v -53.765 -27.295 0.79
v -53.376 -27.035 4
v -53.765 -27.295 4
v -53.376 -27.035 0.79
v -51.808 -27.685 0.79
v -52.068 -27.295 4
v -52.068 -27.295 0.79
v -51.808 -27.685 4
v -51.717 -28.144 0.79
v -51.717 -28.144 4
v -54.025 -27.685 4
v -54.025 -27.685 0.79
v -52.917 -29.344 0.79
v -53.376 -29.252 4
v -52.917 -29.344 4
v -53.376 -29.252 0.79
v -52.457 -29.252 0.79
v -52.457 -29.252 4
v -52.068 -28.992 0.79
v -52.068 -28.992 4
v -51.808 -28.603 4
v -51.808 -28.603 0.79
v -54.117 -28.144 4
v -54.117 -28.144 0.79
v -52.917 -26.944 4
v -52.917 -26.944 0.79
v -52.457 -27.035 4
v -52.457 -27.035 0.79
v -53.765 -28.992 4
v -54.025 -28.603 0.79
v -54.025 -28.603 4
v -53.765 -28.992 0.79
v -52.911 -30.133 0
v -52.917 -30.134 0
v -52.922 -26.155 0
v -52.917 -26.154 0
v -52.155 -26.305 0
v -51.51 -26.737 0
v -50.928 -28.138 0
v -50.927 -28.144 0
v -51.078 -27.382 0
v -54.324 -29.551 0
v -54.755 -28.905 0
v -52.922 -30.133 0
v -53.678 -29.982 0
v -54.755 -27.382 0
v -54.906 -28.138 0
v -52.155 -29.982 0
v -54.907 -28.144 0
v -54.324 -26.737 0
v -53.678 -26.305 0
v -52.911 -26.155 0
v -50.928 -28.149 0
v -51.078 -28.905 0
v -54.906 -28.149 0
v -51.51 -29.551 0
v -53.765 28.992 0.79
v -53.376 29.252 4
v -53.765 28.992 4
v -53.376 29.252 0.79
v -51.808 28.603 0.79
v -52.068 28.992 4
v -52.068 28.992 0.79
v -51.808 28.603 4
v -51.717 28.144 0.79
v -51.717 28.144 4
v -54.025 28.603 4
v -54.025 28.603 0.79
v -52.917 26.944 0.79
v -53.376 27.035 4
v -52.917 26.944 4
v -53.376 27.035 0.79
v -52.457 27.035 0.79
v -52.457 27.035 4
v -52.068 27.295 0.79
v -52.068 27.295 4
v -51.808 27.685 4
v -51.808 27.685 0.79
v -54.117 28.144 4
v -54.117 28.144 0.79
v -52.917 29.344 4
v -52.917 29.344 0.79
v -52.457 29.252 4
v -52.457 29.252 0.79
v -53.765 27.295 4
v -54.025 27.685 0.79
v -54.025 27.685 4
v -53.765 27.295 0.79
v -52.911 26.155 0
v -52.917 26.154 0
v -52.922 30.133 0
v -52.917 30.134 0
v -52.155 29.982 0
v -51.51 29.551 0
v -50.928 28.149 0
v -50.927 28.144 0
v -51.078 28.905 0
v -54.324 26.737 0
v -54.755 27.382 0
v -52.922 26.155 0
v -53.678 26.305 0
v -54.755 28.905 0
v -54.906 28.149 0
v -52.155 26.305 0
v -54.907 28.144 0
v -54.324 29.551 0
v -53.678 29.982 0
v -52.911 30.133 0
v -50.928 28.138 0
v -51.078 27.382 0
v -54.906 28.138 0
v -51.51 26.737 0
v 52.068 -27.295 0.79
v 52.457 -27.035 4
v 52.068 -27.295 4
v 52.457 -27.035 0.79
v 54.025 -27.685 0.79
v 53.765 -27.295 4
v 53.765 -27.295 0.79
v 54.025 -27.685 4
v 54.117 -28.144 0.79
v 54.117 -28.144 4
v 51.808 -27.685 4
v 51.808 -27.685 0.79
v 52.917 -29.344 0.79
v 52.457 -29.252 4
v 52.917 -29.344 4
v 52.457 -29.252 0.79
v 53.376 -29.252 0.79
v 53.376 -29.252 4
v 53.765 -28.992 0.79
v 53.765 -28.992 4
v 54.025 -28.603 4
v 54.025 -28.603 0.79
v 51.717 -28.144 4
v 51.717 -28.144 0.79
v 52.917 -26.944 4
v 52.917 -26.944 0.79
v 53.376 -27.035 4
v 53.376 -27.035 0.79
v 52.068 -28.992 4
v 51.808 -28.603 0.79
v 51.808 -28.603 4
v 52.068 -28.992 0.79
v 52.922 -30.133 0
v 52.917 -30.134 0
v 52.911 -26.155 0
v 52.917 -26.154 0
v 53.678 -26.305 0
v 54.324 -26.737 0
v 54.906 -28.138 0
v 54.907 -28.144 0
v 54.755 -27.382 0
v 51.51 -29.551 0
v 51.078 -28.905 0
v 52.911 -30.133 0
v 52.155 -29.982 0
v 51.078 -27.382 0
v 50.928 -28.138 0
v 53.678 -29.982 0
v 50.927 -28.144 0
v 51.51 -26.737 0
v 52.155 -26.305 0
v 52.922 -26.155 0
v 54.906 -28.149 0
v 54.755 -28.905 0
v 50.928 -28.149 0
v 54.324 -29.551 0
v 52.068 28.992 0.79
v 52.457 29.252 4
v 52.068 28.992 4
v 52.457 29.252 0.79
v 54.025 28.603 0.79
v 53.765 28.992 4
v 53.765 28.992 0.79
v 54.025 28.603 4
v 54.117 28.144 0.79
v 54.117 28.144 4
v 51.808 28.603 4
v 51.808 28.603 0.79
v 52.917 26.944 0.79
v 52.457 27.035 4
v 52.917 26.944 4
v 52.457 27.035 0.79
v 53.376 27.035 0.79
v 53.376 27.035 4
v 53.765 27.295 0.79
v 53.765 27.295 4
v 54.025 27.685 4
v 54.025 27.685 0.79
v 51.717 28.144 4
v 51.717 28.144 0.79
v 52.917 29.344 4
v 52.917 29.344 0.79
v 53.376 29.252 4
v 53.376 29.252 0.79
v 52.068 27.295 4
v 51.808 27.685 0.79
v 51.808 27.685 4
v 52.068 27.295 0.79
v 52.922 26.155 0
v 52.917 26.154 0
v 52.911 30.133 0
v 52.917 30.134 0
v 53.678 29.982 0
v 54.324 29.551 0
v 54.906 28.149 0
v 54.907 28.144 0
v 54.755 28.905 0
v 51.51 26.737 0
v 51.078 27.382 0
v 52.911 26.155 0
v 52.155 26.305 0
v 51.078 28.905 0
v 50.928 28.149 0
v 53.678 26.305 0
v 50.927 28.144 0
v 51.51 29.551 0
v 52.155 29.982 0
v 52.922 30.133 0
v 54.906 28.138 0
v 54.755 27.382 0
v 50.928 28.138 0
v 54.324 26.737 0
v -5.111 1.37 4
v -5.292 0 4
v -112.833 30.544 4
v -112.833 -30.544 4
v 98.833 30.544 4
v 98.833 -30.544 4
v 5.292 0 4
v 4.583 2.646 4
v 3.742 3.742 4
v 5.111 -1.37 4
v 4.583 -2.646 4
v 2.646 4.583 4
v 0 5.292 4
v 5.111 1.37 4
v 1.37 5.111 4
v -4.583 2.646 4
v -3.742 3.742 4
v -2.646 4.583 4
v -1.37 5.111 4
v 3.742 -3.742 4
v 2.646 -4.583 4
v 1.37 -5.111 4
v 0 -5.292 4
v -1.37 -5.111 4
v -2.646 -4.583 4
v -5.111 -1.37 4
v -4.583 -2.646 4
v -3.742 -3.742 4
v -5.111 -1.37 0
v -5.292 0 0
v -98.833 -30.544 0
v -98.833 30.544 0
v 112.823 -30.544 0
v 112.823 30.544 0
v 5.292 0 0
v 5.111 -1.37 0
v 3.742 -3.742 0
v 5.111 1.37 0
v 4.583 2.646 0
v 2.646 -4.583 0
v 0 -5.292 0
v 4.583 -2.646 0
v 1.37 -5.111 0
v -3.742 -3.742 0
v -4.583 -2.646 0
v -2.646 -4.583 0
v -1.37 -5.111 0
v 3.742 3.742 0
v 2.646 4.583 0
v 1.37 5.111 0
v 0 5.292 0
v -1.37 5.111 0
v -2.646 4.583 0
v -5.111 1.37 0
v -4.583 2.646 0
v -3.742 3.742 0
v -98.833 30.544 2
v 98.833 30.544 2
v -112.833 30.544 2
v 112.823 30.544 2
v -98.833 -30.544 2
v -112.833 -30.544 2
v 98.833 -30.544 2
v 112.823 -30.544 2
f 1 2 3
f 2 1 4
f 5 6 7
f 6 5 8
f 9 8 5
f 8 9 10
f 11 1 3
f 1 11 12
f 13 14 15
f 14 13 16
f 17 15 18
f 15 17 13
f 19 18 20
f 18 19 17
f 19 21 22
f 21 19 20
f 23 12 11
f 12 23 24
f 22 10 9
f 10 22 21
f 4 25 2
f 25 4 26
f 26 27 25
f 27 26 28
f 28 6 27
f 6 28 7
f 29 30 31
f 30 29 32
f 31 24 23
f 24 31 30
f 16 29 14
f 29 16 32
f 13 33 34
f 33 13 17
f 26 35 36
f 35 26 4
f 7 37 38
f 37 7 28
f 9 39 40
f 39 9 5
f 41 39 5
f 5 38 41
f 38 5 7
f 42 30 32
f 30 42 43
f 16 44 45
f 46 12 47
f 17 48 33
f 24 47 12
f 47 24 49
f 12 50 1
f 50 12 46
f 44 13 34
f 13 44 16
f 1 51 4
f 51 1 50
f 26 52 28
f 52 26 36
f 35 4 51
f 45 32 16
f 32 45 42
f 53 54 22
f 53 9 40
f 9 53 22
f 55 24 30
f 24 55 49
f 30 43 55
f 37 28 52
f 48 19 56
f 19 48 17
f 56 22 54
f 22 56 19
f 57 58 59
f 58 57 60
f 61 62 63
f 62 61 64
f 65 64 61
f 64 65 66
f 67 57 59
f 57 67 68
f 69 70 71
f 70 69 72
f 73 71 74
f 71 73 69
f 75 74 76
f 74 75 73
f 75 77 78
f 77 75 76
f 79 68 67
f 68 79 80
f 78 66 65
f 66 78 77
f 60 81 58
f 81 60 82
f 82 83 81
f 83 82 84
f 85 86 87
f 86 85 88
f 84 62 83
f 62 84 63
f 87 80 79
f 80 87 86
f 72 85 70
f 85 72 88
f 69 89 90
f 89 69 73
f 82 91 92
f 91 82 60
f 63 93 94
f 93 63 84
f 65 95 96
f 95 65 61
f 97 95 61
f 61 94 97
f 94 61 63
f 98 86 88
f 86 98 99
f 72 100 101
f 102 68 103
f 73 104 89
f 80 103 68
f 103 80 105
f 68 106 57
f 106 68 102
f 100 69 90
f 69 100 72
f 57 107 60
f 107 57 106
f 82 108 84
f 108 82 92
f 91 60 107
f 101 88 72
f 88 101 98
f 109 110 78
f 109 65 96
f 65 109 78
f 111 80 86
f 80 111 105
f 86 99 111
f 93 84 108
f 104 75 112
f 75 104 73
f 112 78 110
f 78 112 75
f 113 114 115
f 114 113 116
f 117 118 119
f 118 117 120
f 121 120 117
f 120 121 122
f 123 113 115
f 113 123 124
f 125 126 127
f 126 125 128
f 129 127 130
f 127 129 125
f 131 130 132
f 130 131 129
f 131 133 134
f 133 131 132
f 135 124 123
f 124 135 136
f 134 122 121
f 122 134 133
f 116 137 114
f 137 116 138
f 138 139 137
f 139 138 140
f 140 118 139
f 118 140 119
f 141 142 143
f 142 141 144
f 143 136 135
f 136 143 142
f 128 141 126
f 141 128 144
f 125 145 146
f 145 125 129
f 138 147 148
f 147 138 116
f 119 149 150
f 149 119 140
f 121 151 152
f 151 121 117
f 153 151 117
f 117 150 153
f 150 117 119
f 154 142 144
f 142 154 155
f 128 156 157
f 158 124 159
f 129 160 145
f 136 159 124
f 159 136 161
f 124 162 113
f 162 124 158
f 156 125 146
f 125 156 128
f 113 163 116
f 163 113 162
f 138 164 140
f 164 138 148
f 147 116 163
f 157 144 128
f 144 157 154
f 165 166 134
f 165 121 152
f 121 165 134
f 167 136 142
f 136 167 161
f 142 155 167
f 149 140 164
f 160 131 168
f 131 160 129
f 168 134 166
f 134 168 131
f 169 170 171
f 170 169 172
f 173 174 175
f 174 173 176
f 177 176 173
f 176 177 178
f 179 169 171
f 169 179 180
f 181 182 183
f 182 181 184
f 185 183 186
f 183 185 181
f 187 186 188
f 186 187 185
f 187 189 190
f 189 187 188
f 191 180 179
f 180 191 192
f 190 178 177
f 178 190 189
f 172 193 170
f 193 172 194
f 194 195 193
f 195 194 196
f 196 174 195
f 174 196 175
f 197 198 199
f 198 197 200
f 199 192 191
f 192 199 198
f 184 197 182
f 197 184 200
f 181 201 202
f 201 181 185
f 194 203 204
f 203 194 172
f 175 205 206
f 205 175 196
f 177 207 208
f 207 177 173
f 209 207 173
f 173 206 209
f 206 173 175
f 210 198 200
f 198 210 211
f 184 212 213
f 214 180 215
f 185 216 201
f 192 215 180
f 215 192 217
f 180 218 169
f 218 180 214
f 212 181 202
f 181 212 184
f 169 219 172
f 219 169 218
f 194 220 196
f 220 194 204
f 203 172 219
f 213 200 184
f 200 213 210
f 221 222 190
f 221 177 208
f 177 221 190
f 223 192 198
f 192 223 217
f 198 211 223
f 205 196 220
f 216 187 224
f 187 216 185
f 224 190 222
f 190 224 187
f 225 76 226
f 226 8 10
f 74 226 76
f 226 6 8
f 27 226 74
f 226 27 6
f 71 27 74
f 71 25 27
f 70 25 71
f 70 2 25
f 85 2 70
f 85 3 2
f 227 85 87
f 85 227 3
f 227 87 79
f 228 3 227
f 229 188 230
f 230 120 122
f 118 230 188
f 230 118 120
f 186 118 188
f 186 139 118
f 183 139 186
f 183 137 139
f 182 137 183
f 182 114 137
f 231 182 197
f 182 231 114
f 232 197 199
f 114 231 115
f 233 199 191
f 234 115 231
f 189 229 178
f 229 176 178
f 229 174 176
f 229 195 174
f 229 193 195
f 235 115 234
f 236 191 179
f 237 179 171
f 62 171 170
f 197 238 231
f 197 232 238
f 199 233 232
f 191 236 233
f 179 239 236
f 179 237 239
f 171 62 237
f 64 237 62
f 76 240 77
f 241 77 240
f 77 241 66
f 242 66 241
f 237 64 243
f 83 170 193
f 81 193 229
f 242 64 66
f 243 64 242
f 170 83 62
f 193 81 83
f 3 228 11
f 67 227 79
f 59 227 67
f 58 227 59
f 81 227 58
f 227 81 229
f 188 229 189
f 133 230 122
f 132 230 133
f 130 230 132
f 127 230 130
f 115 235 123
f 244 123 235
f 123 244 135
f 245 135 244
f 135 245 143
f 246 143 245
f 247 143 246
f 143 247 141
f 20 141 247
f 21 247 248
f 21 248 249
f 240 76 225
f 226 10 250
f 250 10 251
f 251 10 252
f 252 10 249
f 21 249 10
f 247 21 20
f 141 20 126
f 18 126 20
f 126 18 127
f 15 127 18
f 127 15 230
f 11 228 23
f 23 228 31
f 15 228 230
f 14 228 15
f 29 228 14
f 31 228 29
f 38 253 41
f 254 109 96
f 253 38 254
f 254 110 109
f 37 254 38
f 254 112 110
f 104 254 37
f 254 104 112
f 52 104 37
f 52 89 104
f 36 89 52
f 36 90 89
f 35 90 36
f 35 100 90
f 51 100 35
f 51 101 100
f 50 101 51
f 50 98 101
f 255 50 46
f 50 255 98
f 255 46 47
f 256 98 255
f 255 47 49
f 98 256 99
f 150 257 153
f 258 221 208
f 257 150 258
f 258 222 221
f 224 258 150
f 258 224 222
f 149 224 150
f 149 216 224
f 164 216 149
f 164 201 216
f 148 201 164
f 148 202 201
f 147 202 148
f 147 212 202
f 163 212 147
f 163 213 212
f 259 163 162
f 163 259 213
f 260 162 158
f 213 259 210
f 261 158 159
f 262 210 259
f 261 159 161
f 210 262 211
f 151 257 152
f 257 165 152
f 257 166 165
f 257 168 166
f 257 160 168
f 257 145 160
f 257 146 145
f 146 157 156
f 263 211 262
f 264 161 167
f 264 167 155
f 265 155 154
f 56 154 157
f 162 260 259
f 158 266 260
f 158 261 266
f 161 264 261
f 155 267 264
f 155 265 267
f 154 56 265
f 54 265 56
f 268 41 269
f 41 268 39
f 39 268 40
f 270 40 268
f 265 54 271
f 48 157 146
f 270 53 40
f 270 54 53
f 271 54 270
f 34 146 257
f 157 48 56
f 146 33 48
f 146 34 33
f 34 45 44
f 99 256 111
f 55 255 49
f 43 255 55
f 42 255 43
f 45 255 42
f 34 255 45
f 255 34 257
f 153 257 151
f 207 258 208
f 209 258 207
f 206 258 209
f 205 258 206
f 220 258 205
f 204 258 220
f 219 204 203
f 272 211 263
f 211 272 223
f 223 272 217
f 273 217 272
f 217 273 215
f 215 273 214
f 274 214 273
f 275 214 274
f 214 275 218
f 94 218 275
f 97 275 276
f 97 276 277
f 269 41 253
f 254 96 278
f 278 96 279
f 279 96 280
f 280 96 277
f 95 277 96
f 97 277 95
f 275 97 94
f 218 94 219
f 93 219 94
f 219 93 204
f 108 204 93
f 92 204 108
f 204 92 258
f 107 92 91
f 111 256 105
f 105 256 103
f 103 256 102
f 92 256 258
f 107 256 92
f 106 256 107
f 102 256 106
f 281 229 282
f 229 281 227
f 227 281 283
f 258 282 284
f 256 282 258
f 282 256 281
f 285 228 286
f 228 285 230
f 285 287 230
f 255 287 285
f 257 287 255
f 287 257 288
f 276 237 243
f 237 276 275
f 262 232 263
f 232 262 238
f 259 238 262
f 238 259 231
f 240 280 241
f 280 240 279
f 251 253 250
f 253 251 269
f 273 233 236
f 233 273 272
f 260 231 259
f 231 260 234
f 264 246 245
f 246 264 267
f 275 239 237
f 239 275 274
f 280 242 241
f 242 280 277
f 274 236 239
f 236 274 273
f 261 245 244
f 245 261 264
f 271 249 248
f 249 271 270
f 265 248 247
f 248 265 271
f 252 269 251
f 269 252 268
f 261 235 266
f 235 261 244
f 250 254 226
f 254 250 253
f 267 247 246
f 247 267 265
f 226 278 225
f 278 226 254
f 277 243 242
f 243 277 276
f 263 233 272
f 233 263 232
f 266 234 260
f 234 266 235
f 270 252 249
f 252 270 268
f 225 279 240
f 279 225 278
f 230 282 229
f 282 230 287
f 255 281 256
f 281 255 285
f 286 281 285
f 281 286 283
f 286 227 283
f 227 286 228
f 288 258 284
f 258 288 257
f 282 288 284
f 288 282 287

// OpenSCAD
// file: ../../library/e7_all.scad
// ==========================================================================
//  e7_all.scad - include this one file. Preview, print plates and the report.
// ==========================================================================
include <e7_params.scad>
include <e7_body.scad>

// whole painted loco
module e7_preview() {
  // carbody in its paint bands
  for (i = [0:len(PAINT_BANDS) - 1]) {
    z0 = i == 0 ? -1 : p(PAINT_BANDS[i - 1][0]);
    z1 = i == len(PAINT_BANDS) - 1 ? 1000 : p(PAINT_BANDS[i][0]);
    color(PAINT_BANDS[i][1]) render(convexity = 8) e7_shell_solid([z0, z1]);
  }
  color(C_GLASS) e7_glass();
  color(C_LENS) let (d = nose_d_at_z(HEADLIGHT[0]))
    translate([XF - p(d) + p(HEADLIGHT[2]) + p(1.5), 0, p(HEADLIGHT[0])]) rotate([0, 90, 0]) cylinder(d = p(HEADLIGHT[1]) - 0.8, h = 0.5, $fn = 32);
  color(C_FRAME) { for (j = [1:NFRAME]) e7_frame_piece(j); e7_pilot(); e7_pilot_rear(); }
  for (tx = [TRK_X, -TRK_X]) translate([tx, 0, 0]) { color(C_TRUCK) e7_truck_frame(); color(C_WHEEL) e7_wheels(); }
}
// thin glass panes sitting in the window pockets (preview only)
module e7_glass() {
  intersection() { e7_loft(DET * 0.6); union() { e7_windshield_cut(); e7_side_cuts_windows_only(); } }
}
module e7_side_cuts_windows_only() {
  for (s = [-1, 1], w = CAB_WIN)
    translate([XF - p(w[1]), s * HW - (s > 0 ? DET : 3 - DET), p(w[2])]) cube([p(w[1] - w[0]), 3, p(w[3] - w[2])]);
}

// one print, laid out for the printer
module e7_plate(part) {
  sec = [for (k = [1:NSEC]) str("body_", k)];
  frm = [for (j = [1:NFRAME]) str("frame_", j)];
  if (is_num(search([part], sec)[0])) {
    k = search([part], sec)[0] + 1;
    // stand the section on its open bottom (skirt edge on the bed)
    translate([-sec_x0(k) - SEC_L / 2, 0, -Z_SKIRT]) e7_body_section(k);
  } else if (is_num(search([part], frm)[0])) {
    j = search([part], frm)[0] + 1;
    xs = concat([FRAME_X0], FRAME_SPLITS, [FRAME_X1]);
    translate([-(xs[j - 1] + xs[j]) / 2, 0, -Z_FRAME_BOT]) e7_frame_piece(j);
  } else if (part == "pilot") {
    translate([-XF, 0, 0]) rotate([0, 0, 0]) translate([0, 0, -p(5)]) e7_pilot();
  } else if (part == "pilot_rear") {
    translate([-XR, 0, 0]) translate([0, 0, -(CPL_Z - CPL_H / 2 - WALL)]) e7_pilot_rear();
  } else if (part == "truck") {
    // upside down, bolster on the bed
    translate([0, 0, Z_FRAME_BOT - 0.3]) rotate([180, 0, 0]) e7_truck_frame();
  } else {
    assert(false, str("unknown part '", part, "'"));
  }
}

module e7_report() {
  echo(str("MILW E7A ", ROAD_NO, " class ", CLASS, " - ", SC, " scale 1:", RATIO, ", paint ", PAINT));
  echo(str("  carbody ", round(BL), " mm long, ", round(2 * HW), " mm wide, roof ", round(Z_ROOF), " mm, cab ", round(Z_CAB), " mm above rail"));
  echo(str("  ", NSEC, " body sections of ", round(SEC_L), " mm; ", NFRAME, " frame pieces; trucks at +/- ", round(TRK_X), " mm"));
  echo(str("  body screws ", SCREW_BODY_NAME, " x ", 2 * len(BOSS_X), "; truck pivots ", PIVOT[1], "; wheels ", round(WHEEL_D * 10) / 10, " mm (bought)"));
}
// main file
// Milwaukee Road E7A, O scale 1-48 - print 4 of 8: frame_2 - frame plate piece 2 (print flat)
// Render (F6), export STL, print. Settings: ../../library/e7_params.scad
// Whole loco preview and notes: ../../MILW_E7_Main.scad
SCALE_SEL = "O";
include <../../library/e7_all.scad>
e7_plate("frame_2");
